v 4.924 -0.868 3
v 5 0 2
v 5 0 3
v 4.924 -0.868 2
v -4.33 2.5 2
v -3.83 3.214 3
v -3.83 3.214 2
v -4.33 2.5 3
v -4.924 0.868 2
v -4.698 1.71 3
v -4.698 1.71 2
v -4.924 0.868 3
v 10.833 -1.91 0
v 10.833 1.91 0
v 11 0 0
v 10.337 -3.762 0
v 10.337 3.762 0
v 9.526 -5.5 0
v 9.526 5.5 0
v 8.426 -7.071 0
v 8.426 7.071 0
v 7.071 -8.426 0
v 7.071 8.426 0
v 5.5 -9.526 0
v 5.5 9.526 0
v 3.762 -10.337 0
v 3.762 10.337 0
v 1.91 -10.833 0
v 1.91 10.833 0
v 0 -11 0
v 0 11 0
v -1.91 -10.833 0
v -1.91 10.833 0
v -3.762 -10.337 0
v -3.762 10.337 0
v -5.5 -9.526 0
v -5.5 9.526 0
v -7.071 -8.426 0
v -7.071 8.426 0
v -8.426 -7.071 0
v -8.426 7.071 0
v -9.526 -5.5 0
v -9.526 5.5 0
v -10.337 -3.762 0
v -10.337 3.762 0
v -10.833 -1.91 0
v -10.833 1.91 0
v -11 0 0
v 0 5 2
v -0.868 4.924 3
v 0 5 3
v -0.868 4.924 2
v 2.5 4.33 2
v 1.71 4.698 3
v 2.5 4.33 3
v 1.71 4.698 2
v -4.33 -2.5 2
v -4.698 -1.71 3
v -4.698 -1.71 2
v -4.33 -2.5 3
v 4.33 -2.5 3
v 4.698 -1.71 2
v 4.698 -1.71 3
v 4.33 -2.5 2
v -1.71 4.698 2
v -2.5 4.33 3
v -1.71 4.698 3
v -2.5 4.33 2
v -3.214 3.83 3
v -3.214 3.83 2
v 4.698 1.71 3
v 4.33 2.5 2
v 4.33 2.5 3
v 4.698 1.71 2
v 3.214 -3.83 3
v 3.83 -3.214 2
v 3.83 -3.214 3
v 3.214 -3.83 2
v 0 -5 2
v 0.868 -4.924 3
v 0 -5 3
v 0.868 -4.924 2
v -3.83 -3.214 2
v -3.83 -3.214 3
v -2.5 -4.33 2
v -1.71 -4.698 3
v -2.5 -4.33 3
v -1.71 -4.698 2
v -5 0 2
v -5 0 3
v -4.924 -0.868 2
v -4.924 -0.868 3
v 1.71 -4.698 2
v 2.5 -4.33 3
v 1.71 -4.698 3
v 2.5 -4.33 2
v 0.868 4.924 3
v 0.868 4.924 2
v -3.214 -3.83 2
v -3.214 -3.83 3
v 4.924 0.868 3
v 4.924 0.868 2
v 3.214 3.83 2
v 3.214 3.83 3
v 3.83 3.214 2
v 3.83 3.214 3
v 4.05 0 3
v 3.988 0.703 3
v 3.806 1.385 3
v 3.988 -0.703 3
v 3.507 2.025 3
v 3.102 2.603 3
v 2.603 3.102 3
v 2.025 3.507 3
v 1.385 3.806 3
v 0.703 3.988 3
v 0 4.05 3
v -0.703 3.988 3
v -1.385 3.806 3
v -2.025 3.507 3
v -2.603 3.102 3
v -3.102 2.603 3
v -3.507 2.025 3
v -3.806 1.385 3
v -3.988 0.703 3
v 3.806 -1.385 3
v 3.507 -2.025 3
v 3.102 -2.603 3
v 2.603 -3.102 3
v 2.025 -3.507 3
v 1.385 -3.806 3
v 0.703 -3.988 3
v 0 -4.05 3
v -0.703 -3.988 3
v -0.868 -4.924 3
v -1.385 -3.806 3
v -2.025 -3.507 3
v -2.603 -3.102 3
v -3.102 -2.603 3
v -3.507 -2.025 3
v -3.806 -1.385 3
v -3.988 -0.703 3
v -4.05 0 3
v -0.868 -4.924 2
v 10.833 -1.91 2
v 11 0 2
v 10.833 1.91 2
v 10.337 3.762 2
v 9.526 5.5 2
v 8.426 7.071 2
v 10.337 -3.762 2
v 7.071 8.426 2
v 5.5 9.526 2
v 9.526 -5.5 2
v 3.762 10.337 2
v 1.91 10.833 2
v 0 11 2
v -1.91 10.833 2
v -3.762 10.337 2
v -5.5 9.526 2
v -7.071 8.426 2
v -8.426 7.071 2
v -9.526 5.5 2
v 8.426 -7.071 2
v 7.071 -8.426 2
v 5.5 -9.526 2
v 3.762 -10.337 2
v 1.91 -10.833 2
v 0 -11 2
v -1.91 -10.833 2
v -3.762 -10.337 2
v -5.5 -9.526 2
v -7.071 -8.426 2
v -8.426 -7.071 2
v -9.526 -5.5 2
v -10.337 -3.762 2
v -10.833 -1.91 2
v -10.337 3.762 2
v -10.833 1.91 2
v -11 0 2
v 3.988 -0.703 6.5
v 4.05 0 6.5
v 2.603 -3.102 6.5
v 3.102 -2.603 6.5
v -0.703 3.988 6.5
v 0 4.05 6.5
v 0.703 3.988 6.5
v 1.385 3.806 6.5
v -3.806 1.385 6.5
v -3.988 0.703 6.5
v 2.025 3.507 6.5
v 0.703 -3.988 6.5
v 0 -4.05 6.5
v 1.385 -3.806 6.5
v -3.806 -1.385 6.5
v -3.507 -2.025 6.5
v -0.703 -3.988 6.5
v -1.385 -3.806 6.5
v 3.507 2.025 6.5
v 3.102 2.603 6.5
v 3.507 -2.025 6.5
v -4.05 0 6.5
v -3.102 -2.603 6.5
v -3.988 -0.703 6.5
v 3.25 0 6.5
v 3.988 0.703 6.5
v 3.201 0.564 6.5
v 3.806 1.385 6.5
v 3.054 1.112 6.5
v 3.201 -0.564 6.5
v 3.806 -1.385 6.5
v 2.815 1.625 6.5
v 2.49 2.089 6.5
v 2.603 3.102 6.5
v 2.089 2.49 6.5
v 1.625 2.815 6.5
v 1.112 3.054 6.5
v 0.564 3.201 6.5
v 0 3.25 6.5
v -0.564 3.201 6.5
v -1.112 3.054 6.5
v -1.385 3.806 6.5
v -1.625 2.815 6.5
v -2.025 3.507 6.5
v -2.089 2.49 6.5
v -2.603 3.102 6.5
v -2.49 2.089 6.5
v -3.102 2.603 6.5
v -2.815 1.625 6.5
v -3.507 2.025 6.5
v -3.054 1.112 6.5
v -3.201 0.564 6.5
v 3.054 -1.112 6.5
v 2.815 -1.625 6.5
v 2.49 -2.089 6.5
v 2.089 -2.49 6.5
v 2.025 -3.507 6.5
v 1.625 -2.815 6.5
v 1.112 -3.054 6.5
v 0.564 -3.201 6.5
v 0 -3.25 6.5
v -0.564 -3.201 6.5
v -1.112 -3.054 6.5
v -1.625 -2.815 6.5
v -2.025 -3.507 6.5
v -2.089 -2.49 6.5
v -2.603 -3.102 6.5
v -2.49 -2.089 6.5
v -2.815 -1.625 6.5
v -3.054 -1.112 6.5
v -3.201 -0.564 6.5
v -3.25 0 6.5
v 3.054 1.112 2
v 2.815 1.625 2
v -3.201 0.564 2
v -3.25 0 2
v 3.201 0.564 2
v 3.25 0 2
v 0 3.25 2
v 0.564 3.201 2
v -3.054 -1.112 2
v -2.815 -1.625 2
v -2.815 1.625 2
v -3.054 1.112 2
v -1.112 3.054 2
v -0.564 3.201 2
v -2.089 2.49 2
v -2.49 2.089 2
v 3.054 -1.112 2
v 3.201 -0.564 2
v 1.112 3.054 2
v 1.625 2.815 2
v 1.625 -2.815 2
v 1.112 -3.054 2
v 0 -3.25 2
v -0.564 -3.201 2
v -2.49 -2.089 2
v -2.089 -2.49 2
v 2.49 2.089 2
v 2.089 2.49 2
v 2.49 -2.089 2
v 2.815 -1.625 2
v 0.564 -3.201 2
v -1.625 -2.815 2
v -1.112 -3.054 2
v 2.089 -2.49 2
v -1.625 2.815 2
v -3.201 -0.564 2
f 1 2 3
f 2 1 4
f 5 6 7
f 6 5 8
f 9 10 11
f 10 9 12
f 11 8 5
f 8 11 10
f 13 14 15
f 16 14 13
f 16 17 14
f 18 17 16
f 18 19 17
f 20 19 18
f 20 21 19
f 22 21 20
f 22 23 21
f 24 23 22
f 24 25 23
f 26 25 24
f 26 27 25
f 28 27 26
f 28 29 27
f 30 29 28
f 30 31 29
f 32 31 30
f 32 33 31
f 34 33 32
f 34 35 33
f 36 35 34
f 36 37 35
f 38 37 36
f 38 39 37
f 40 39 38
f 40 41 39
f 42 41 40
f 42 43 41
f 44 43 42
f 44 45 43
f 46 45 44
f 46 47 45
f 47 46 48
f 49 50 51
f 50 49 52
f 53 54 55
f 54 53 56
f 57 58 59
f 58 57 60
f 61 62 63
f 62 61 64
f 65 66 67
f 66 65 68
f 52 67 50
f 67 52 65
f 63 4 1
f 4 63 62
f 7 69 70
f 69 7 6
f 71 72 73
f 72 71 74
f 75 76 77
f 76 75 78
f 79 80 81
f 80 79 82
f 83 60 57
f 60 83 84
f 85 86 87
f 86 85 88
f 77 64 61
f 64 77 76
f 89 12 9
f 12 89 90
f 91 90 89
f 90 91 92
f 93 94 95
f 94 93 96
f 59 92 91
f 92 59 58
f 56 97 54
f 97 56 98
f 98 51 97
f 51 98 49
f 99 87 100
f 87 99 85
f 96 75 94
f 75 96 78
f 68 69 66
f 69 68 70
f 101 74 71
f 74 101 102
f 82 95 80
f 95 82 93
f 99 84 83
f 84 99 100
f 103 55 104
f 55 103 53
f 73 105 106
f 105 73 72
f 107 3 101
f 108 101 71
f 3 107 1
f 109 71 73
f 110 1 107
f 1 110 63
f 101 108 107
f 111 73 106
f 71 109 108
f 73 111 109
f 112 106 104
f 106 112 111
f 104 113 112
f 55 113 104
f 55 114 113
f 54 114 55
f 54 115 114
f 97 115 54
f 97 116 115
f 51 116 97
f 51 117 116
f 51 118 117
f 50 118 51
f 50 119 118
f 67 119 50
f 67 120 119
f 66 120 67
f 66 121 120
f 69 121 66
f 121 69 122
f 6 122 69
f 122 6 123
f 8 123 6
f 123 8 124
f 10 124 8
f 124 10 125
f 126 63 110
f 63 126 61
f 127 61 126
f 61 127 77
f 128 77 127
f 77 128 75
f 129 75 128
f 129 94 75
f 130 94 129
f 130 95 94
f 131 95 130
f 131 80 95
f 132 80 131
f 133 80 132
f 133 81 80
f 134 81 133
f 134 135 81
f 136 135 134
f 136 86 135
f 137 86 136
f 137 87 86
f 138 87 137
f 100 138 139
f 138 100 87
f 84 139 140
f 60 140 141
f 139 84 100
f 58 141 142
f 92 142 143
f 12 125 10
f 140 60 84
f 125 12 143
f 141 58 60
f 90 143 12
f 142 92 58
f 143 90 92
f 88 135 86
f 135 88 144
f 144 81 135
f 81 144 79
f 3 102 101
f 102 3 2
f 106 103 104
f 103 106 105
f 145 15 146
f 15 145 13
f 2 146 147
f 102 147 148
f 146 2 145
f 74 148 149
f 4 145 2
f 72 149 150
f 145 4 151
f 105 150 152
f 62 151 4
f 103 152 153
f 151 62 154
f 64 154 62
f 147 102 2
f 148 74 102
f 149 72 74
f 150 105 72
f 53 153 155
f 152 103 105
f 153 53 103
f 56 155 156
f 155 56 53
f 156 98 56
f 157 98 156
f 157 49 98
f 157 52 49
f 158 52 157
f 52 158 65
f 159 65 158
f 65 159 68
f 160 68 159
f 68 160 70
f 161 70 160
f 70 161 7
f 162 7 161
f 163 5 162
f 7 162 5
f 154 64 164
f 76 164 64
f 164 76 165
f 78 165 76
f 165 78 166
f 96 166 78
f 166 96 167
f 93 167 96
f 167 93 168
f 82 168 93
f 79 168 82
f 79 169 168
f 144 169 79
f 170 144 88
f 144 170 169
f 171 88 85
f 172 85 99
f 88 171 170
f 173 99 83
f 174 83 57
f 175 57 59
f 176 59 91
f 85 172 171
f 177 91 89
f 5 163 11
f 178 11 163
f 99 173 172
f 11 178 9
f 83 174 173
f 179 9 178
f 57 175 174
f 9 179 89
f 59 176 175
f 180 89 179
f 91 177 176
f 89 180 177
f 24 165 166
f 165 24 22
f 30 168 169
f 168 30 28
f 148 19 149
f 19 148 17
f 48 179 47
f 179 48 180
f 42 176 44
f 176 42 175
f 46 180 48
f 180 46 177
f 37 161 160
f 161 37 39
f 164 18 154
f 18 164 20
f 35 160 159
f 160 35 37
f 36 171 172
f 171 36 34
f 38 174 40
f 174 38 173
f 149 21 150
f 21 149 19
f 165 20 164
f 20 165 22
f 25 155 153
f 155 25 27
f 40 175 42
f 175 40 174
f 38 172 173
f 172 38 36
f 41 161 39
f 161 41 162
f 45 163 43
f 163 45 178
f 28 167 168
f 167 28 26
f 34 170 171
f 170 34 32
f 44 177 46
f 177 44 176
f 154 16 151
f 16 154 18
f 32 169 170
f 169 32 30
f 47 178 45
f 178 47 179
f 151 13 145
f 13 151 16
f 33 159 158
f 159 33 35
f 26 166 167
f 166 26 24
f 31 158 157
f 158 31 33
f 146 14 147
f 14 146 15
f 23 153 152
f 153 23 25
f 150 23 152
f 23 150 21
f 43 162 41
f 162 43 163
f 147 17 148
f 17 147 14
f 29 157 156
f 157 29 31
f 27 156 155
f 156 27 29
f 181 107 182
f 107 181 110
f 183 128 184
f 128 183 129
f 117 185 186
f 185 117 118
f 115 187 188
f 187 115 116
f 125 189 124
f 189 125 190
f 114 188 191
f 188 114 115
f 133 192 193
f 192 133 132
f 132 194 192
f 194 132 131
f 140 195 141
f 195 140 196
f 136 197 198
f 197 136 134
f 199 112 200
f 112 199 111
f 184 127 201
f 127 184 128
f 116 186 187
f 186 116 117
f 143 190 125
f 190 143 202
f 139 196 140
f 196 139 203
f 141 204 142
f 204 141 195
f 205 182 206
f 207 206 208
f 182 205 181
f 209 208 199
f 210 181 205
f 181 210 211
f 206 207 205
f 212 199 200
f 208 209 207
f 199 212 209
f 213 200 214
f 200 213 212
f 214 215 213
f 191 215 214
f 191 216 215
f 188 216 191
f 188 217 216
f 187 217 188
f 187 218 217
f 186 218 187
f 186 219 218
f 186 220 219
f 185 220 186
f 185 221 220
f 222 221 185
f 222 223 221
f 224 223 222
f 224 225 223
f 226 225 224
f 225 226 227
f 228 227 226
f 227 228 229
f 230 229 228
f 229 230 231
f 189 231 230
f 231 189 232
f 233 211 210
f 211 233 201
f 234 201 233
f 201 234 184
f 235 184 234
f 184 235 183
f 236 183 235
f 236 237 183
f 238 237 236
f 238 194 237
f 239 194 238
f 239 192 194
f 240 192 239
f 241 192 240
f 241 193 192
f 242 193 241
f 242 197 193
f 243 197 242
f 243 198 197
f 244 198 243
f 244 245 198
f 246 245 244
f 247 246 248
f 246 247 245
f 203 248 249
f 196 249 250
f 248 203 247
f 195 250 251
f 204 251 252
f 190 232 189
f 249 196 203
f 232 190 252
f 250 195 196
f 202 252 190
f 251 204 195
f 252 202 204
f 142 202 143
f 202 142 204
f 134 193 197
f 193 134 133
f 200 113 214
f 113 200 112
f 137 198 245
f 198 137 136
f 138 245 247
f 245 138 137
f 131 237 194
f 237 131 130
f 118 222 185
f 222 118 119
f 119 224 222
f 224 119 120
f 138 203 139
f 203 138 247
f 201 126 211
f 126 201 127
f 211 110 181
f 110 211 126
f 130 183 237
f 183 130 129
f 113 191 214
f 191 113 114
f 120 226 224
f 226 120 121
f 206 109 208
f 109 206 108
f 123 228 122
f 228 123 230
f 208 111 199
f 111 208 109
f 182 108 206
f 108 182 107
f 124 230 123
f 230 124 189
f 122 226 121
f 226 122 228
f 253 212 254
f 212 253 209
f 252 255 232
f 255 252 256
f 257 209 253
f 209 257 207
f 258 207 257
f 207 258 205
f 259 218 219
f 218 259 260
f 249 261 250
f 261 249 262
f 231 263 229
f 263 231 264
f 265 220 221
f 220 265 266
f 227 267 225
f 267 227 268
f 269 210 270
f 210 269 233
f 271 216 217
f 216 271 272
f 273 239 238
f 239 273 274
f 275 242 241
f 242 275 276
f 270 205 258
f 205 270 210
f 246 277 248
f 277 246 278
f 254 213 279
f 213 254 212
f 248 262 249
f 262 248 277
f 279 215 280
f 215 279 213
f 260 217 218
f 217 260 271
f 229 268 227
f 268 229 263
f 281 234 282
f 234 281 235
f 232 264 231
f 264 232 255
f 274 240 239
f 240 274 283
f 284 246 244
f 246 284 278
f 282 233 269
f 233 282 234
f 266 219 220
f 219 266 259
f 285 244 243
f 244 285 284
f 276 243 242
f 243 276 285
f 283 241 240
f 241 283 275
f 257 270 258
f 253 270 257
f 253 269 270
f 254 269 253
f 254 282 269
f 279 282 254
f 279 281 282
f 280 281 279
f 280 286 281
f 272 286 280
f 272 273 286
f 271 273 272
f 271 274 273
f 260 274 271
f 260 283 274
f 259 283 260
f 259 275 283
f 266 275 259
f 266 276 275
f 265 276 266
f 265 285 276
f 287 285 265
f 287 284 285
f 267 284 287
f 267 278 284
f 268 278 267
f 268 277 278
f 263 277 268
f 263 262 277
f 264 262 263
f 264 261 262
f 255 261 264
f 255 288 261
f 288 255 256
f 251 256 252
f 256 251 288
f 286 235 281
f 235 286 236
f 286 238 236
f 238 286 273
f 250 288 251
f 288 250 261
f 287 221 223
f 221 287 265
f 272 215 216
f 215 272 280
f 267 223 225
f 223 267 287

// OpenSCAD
difference () {

union() {
linear_extrude (6.5)
circle (d=8.1, $fn=36);


union () {
linear_extrude (3)
circle (d=10, $fn=36);

linear_extrude (2)
circle (d=22, $fn=36);
}
}

translate ([0,0,2])
linear_extrude (10)
circle (d=6.5, $fn=36);
}
